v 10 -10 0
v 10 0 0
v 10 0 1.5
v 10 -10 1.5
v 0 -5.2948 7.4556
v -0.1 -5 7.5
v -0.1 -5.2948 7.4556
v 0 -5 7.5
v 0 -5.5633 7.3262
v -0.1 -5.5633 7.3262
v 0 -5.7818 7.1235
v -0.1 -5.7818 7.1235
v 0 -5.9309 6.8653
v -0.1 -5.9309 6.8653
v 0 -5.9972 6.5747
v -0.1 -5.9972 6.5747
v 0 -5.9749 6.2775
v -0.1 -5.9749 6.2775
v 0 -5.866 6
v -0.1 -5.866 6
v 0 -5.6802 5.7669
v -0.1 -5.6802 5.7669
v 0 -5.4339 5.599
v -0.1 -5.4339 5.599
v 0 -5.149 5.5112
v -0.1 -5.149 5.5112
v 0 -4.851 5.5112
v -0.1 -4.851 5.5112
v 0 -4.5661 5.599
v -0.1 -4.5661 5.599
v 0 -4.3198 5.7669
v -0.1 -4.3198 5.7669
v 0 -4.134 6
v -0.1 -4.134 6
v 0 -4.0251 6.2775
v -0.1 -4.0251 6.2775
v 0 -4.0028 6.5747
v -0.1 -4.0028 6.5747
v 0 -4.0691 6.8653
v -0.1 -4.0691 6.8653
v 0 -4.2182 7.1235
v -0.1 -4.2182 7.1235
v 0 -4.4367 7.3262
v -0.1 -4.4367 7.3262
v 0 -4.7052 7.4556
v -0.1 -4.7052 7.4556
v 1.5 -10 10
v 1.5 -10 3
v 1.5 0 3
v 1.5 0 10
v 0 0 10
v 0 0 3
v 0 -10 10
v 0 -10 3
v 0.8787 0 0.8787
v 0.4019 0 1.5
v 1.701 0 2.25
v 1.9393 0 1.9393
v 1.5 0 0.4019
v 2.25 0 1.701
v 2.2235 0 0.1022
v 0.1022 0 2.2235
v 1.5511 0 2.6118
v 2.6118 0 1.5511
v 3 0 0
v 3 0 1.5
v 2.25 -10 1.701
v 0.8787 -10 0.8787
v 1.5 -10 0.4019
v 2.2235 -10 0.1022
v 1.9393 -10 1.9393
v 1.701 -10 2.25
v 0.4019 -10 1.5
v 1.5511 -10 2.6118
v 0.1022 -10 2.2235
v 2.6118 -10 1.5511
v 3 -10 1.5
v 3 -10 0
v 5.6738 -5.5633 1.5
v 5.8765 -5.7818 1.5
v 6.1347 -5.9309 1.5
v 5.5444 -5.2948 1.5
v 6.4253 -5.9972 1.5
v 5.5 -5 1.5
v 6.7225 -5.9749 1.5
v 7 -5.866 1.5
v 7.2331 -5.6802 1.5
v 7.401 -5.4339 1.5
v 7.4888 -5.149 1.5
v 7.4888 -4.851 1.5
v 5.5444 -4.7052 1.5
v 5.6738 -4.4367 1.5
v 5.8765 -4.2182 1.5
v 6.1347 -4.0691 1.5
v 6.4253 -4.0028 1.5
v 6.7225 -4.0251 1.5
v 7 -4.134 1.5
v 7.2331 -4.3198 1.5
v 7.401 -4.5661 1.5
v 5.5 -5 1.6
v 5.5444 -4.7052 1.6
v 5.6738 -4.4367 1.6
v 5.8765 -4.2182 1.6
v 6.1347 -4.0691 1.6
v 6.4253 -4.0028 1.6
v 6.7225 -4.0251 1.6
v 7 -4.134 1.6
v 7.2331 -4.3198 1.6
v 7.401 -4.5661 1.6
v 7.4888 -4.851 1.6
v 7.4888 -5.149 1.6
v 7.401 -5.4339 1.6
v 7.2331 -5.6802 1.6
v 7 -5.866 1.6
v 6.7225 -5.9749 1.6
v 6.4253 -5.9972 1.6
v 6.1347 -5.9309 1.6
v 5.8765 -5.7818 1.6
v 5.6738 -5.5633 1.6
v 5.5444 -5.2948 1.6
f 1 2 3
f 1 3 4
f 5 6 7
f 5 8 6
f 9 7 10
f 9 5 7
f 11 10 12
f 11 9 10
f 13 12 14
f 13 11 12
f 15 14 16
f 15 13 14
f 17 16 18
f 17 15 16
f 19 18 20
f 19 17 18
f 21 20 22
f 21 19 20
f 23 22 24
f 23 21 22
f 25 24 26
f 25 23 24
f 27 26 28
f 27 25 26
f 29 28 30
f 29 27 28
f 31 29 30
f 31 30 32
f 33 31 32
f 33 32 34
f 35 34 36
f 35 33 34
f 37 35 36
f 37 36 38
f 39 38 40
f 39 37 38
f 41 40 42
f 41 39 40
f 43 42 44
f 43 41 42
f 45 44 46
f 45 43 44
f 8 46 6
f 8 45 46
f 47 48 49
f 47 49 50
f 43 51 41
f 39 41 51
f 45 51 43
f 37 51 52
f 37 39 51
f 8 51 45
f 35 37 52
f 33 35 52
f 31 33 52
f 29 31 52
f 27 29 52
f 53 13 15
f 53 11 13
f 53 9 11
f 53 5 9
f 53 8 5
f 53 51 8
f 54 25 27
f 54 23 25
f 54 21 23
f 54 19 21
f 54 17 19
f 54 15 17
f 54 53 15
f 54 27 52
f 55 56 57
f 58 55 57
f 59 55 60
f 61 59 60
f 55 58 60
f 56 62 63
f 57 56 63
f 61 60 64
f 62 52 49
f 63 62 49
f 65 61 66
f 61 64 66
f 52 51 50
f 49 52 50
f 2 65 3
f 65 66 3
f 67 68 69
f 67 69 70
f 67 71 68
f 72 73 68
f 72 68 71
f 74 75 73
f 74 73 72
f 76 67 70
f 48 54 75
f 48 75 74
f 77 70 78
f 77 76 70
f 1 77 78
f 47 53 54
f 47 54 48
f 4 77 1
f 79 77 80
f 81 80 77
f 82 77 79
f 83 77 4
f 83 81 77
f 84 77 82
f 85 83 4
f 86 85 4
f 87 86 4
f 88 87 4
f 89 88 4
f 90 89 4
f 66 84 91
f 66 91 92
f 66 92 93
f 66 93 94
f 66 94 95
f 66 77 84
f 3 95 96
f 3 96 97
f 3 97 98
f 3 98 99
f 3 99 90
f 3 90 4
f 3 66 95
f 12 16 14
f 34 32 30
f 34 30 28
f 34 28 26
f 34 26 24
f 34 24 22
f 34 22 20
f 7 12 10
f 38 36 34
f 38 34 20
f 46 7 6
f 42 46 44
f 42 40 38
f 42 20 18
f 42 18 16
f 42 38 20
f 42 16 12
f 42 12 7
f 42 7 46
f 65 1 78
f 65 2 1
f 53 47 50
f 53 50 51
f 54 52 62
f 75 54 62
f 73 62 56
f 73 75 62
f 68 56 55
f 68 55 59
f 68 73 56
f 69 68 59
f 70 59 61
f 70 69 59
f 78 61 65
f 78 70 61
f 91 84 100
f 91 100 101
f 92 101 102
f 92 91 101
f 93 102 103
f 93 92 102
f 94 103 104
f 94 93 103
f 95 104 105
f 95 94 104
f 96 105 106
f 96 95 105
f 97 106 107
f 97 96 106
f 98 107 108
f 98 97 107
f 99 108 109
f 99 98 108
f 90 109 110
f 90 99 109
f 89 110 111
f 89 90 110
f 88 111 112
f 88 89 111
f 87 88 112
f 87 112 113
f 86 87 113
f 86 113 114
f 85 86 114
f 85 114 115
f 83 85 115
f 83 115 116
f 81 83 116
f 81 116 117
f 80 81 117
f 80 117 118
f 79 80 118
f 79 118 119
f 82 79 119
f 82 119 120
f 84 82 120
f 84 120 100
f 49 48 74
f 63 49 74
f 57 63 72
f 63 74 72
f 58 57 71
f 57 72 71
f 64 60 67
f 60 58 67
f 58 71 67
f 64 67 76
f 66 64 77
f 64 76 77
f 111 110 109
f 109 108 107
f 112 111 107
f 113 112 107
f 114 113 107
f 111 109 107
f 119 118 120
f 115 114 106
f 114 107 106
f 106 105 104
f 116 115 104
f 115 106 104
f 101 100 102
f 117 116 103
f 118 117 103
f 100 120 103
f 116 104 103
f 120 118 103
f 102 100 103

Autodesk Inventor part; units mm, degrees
ref_plane "YZ Plane" through (0, 0, 0) normal (1, 0, 0) x (0, 1, 0)
ref_plane "XZ Plane" through (0, 0, 0) normal (0, 1, 0) x (-1, 0, 0)
ref_plane "XY Plane" through (0, 0, 0) normal (0, 0, 1) x (1, 0, 0)
sketch "Sketch1" plane through (0, 0, 0) normal (0, 0, 1) x (1, 0, 0)
  line L0 (0, 0) -> (10, 0)
  line L1 (10, 0) -> (10, -10)
  line L2 (10, -10) -> (0, -10)
  line L3 (0, -10) -> (0, 0)
  dimension "d0" = 10
  dimension "d1" = 10
extrude "Extrusion1" add sketch "Sketch1" along normal blind 1.5
sketch "Sketch2" plane through (1.5, -10, 0) normal (-1, 0, 0) x (0, -1, 0)
  line L0 (-10, 0) -> (0, 0)
  line L1 (0, 0) -> (0, 10)
  line L2 (0, 10) -> (-10, 10)
  line L3 (-10, 10) -> (-10, 0)
edge flange "Flange1" height 10 angle 90 thickness 1.5 bend radius 1.5 thickness toward (-1, 0, 0) relief tear relief width 1.5 relief depth 0.75 edges at (0, -5, 1.5) wall of the first edge with corners at (1.5, 0, 0) (1.5, -10, 0) (1.5, -10, 10) (1.5, 0, 10)
bend "Bend1"
corner "Corner1"
sketch "Sketch3" plane through (0, -10, 10) normal (-1, 0, 0) x (0, 0, 1)
  circle A0 centre (-3.5, 5) radius 1
  line L0 (0, 10) -> (0, 0) projected
  line L1 (-7, 10) -> (0, 10) projected
  point P0 (-10, 10)
  dimension "d15" = 2
  dimension "d16" = 3.5
  dimension "d17" = 5
extrude "Extrusion2" add sketch "Sketch3" along normal blind 0.1
sketch "Sketch4" plane through (0, 0, 0) normal (0, 0, -1) x (-1, 0, 0)
  circle A0 centre (-6.5, -5) radius 1
  line L0 (-10, -10) -> (-3, -10) projected
  line L1 (-10, 0) -> (-10, -10) projected
  point P0 (0, 0)
  dimension "d20" = 2
  dimension "d21" = 5
  dimension "d22" = 3.5
extrude "Extrusion3" add sketch "Sketch4" against normal blind 1.6
sketch "Sketch5" plane through (0, 0, 1.5) normal (0, 0, 1) x (1, 0, 0)
  line L0 (3, 0) -> (3, -10) projected
  circle A0 centre (6.5, -5) radius 1 projected
  point P0 (0, 0)
equation "\"d4\" = Thickness"
equation "\"d5\" = BendReliefWidth"
equation "\"d6\" = BendReliefDepth"
equation "\"d7\" = MinimumRemnant"
equation "\"d8\" = TransitionRadius"
equation "\"d11\" = BendRadius"
equation "\"d12\" = CornerReliefSize"
equation "\"d13\" = GapSize"
equation "\"d14\" = JacobiRadiusSize"
equation "\"BendRadius\" = Thickness"
equation "\"BendReliefWidth\" = Thickness"
equation "\"BendReliefDepth\" = 0.5 * Thickness"
equation "\"CornerReliefSize\" = 4 * Thickness"
equation "\"MinimumRemnant\" = 2 * Thickness"
equation "\"TransitionRadius\" = BendRadius"
equation "\"JacobiRadiusSize\" = BendRadius"
equation "\"GapSize\" = Thickness"
equation "\"Thickness\" = 1.5"
properties part number "center_joint"
